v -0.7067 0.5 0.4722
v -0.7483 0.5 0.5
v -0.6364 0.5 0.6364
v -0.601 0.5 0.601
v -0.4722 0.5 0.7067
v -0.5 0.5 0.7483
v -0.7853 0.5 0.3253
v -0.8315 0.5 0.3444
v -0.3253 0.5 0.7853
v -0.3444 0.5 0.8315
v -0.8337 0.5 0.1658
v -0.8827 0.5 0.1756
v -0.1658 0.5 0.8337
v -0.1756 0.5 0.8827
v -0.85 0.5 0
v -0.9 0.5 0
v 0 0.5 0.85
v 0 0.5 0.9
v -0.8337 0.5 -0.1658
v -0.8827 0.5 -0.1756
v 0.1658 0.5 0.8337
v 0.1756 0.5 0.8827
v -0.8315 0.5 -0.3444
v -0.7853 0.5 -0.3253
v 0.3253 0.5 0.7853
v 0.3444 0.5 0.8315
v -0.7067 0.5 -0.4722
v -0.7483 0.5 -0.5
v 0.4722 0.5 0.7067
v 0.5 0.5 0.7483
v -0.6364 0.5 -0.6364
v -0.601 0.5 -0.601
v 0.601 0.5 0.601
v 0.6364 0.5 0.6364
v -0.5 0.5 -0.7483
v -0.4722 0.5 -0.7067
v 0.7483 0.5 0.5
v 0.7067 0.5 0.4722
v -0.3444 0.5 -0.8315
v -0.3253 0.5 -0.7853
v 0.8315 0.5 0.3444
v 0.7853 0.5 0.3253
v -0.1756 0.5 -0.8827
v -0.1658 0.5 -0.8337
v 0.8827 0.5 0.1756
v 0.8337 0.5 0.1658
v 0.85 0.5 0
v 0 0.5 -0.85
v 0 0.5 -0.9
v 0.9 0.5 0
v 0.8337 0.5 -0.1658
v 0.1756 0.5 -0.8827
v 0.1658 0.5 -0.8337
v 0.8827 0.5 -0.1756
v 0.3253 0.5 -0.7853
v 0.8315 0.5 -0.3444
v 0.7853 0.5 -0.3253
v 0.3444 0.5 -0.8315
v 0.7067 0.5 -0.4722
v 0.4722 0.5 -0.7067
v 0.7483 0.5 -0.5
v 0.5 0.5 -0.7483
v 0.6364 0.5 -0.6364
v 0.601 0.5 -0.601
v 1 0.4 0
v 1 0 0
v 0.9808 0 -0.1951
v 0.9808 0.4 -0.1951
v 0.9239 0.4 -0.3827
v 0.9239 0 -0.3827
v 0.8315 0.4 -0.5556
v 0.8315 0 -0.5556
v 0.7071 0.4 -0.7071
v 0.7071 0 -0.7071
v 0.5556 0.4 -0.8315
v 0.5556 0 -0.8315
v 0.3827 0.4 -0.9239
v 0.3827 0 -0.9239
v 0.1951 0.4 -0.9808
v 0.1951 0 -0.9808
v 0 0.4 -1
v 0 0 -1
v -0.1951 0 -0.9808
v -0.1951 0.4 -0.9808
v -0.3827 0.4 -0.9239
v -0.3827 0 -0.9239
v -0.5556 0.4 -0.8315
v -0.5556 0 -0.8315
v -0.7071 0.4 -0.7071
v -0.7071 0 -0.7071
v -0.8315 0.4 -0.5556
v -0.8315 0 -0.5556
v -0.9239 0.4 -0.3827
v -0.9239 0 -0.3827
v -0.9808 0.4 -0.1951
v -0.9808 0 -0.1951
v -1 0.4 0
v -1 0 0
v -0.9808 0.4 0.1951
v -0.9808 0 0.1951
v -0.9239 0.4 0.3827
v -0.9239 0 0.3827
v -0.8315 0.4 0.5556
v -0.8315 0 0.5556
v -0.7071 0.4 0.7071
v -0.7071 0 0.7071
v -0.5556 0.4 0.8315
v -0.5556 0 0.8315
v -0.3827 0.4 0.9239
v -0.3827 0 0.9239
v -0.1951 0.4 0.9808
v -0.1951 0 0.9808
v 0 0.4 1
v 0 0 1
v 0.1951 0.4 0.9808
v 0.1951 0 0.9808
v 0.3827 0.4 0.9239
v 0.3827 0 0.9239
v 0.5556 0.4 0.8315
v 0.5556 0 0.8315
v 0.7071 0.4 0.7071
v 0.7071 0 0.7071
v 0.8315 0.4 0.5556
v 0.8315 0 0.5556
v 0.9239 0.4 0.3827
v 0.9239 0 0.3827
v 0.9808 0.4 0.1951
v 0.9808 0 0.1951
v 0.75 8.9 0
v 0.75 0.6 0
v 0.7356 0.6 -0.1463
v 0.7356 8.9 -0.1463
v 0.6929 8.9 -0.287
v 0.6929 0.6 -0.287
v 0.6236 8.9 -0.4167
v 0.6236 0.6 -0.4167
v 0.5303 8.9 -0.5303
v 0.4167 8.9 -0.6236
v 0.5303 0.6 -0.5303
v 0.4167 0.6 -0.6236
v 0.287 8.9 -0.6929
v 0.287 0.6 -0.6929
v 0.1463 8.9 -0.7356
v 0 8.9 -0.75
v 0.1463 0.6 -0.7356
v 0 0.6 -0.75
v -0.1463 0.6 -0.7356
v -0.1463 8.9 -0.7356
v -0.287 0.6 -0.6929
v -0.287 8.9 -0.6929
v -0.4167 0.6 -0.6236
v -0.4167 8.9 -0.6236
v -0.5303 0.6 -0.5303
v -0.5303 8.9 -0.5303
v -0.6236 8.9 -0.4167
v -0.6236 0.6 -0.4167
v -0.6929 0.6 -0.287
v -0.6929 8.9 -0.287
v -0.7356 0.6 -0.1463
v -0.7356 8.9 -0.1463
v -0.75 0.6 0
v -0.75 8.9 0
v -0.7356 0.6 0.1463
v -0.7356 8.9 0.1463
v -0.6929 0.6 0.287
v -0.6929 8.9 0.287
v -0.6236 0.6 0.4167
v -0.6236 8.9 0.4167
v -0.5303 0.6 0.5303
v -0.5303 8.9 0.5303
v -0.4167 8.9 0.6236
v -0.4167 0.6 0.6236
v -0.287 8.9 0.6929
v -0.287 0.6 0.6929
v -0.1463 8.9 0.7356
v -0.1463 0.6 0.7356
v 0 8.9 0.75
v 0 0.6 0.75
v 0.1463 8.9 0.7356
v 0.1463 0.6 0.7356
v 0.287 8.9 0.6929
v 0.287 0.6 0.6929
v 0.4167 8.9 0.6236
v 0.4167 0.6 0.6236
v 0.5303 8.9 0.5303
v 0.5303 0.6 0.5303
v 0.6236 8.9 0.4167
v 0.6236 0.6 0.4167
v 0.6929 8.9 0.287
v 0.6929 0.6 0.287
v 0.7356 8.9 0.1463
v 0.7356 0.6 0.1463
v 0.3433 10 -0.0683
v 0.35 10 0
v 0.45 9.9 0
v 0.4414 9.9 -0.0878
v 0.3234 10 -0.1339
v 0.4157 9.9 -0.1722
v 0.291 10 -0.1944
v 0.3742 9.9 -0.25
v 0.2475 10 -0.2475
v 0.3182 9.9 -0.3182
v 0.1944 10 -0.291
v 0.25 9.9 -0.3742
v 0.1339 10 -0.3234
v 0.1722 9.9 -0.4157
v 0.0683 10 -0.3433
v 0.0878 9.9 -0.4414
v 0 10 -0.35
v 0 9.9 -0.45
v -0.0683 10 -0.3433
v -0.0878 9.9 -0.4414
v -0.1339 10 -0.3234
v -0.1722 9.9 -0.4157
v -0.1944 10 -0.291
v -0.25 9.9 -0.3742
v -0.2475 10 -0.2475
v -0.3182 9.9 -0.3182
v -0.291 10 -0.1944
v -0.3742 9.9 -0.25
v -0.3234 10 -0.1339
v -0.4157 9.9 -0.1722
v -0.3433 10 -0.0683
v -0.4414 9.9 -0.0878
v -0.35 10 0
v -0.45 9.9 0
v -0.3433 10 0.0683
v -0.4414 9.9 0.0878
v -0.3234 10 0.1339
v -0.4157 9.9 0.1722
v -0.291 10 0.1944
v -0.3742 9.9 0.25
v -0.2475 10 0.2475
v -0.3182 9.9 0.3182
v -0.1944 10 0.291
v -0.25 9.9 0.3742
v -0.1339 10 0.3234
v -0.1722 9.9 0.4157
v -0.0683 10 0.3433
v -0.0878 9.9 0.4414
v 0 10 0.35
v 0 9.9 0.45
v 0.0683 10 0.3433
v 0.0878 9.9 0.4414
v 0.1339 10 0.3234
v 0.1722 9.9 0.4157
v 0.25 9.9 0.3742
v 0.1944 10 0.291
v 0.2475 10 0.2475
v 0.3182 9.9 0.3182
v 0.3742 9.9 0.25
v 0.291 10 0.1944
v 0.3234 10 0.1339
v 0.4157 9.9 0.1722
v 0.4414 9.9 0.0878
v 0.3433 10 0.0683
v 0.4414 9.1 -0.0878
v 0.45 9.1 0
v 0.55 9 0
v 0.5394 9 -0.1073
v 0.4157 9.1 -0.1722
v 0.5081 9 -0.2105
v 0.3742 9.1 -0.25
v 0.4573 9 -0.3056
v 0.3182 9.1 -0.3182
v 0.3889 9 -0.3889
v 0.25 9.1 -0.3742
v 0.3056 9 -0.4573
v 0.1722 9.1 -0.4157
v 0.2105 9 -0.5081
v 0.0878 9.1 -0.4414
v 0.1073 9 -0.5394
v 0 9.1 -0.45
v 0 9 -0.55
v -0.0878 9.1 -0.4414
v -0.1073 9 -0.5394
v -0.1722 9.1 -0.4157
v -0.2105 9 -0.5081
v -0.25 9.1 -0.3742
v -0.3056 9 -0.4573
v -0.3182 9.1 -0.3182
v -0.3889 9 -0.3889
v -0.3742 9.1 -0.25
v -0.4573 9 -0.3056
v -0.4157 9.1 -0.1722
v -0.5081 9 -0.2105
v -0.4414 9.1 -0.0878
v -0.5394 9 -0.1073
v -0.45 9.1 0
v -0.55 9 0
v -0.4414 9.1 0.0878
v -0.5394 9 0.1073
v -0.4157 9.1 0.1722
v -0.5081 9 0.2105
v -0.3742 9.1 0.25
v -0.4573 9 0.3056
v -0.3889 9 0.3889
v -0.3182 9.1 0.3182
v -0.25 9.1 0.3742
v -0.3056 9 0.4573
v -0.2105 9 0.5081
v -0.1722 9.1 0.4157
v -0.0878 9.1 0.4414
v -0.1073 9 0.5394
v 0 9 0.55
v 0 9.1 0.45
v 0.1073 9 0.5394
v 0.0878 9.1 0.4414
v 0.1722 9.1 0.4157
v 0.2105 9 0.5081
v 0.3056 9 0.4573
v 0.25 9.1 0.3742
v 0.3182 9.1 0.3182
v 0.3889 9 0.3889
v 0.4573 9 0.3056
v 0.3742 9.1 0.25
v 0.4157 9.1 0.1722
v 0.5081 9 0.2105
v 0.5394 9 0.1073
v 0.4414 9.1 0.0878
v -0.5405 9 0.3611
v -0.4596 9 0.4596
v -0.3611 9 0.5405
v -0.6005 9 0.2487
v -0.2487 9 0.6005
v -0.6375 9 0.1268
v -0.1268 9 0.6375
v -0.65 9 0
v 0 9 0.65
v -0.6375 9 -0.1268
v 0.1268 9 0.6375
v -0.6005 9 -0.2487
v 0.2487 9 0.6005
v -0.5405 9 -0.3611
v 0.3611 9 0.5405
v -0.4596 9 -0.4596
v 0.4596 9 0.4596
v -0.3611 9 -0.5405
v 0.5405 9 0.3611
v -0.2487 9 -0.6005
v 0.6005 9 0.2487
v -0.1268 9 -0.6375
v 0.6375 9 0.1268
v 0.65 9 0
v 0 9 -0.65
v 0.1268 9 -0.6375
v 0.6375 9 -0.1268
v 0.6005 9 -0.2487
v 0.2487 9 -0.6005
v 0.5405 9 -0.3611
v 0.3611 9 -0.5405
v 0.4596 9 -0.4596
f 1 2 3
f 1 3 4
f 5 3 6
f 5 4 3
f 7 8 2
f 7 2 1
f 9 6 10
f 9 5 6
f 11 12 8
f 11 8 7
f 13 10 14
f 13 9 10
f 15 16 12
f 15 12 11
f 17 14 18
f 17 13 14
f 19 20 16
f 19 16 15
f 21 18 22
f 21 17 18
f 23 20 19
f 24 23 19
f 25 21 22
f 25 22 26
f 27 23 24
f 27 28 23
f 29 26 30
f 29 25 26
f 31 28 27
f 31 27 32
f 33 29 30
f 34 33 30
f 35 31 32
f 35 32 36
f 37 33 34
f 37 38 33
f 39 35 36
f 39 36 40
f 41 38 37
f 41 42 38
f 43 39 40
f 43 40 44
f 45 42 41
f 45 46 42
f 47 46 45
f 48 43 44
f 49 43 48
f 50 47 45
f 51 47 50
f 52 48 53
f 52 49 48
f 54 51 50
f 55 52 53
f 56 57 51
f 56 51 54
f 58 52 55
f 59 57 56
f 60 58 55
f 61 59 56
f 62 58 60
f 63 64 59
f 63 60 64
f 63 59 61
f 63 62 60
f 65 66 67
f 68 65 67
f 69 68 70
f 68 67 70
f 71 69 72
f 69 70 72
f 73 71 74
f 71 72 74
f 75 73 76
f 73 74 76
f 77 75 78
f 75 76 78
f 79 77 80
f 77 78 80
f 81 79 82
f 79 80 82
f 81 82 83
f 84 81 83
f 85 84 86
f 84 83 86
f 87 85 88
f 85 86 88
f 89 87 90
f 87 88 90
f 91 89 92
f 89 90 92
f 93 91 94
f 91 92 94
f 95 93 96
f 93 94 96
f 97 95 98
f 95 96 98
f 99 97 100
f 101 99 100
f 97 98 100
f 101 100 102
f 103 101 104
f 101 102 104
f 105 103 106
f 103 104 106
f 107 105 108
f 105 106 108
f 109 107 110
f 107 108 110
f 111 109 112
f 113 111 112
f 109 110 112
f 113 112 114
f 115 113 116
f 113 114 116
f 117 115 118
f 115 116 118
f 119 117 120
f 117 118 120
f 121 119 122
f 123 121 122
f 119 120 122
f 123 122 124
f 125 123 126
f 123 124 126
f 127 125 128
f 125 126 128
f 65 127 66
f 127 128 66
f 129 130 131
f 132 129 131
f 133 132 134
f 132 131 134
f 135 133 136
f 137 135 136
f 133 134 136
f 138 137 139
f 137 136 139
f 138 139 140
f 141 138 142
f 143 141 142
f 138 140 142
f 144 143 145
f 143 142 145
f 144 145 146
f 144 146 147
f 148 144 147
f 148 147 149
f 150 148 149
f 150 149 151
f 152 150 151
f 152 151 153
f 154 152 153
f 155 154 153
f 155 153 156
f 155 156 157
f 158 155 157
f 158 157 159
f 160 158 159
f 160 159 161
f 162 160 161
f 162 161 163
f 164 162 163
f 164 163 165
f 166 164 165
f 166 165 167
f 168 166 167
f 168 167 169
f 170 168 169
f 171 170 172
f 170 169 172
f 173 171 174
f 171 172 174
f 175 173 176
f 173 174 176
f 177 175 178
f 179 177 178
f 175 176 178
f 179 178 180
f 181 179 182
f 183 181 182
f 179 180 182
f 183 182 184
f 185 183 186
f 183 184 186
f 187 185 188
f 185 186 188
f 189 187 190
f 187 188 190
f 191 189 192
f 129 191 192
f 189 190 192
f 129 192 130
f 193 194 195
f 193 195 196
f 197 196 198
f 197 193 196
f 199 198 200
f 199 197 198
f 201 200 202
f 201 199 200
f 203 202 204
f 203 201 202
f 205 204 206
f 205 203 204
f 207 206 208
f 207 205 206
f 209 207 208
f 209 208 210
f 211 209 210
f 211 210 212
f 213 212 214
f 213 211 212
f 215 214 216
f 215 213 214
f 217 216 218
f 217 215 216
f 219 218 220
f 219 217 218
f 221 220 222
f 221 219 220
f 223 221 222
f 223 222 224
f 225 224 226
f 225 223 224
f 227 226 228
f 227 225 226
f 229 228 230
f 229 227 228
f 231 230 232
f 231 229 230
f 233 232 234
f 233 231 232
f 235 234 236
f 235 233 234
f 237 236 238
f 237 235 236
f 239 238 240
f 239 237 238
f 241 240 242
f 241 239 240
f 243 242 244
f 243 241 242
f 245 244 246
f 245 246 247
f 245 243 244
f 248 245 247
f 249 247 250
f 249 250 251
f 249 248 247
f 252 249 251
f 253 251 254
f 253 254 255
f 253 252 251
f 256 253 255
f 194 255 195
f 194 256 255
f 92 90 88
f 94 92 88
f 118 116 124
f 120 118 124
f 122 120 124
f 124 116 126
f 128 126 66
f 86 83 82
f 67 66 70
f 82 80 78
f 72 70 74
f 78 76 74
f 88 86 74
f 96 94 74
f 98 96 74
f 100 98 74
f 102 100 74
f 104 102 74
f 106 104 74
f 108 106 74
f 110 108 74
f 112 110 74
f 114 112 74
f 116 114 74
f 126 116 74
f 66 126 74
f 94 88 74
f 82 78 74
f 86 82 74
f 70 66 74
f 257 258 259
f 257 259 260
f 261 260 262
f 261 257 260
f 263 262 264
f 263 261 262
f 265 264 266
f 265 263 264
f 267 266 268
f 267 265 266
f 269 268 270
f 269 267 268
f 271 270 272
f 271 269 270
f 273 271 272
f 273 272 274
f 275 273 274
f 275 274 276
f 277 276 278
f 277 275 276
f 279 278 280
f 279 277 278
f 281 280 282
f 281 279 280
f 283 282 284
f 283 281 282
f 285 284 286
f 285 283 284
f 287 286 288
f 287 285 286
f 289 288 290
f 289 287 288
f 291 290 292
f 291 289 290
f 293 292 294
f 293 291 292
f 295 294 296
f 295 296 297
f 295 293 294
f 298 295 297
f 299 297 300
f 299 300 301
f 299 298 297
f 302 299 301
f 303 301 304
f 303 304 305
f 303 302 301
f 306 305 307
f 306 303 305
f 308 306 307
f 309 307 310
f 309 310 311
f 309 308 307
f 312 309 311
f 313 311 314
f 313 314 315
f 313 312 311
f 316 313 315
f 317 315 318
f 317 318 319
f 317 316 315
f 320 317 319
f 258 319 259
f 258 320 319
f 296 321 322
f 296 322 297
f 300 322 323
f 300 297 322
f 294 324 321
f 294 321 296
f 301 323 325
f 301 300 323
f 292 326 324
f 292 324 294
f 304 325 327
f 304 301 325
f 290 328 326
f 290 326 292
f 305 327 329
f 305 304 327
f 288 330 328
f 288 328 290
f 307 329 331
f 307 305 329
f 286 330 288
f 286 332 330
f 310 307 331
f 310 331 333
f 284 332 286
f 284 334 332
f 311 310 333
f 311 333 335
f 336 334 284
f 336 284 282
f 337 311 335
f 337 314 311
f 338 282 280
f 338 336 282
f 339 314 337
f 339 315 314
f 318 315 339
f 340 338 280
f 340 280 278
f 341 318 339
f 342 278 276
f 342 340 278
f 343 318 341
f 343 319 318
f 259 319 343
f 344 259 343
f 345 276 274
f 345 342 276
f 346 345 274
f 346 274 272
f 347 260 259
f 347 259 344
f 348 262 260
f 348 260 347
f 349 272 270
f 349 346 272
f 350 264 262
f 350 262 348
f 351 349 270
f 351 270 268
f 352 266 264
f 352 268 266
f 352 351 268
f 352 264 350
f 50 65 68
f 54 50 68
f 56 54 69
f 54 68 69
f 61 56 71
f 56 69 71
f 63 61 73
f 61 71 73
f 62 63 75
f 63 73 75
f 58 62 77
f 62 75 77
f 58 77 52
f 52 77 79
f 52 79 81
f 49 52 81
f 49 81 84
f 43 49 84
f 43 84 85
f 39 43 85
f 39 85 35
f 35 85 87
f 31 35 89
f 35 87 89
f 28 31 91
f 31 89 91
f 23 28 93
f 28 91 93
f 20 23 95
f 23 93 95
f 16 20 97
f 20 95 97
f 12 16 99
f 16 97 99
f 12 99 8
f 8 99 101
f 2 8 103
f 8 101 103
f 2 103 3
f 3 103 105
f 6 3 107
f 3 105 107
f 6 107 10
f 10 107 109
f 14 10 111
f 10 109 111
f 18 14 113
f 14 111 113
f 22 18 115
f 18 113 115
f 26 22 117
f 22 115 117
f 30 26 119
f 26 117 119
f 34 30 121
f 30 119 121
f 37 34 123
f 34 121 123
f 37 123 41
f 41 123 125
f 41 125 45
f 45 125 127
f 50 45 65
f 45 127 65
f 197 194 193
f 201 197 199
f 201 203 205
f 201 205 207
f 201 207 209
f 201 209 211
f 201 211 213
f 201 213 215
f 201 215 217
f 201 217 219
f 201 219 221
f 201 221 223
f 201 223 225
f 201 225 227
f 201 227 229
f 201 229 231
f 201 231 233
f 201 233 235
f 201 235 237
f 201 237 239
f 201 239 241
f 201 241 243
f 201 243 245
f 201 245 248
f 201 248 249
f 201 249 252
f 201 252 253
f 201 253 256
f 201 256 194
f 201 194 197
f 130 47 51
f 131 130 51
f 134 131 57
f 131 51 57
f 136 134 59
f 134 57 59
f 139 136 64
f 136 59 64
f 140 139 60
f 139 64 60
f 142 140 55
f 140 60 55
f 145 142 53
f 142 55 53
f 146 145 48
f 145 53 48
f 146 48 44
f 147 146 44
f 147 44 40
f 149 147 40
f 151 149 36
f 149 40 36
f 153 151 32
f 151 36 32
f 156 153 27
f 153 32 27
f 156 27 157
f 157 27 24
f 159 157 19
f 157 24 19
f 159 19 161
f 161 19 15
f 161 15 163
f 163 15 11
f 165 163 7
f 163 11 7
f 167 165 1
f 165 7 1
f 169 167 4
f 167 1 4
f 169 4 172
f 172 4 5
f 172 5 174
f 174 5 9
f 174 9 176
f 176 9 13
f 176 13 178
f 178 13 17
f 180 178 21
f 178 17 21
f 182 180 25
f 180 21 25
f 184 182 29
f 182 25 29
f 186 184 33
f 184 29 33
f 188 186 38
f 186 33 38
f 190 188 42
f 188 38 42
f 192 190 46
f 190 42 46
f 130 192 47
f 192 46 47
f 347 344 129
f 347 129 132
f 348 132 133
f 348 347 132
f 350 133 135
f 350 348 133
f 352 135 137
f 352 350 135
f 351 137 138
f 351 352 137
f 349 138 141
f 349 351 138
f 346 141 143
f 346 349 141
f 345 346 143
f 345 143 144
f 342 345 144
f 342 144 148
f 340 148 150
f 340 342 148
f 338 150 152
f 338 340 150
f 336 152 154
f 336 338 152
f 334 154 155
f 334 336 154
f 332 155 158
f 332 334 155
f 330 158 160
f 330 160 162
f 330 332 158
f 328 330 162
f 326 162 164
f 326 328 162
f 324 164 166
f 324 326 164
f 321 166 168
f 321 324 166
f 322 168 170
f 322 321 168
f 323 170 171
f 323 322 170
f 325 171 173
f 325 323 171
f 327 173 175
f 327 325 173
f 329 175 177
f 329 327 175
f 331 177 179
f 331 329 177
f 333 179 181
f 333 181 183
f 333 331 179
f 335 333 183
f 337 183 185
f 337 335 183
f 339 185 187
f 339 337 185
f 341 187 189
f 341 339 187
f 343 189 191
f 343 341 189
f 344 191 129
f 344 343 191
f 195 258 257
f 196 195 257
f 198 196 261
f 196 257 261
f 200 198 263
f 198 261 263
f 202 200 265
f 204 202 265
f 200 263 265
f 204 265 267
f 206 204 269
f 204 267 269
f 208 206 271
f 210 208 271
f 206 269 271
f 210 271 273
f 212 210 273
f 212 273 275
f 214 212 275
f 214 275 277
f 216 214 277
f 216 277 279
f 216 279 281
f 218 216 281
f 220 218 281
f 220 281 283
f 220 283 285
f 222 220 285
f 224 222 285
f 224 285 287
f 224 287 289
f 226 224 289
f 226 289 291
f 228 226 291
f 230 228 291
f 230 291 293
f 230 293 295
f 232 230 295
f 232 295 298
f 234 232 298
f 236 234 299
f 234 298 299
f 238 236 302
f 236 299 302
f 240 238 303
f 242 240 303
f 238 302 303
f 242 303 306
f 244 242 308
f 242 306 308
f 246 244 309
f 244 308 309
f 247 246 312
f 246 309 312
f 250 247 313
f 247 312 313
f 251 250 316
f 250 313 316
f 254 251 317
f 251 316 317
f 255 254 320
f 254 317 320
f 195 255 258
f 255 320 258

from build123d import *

# Parameters (mm, degrees)
SKETCH_1_R      = 1
SKETCH_1_R_2    = 0.75
EXTRUDE_1_DEPTH = 0.5
SKETCH_1_4_R    = 0.75
SKETCH_1_4_R_2  = 0.45
EXTRUDE_2_DEPTH = 9
SKETCH_1_6_R    = 0.45
EXTRUDE_3_DEPTH = 10
CHAMFER_3_SIZE  = 0.1
CHAMFER_4_SIZE  = 0.1
CHAMFER_5_SIZE  = 0.1


with BuildPart() as part:
    # 草图1 → 凸台-拉伸1 (new body)
    with BuildSketch(Plane(origin=(0, 0, 0), x_dir=(1, 0, 0), z_dir=(0, 1, 0))):
        Circle(SKETCH_1_R)
        Circle(SKETCH_1_R_2, mode=Mode.SUBTRACT)
    extrude(amount=EXTRUDE_1_DEPTH)

    # 草图1<4> → 凸台-拉伸2 (add)
    with BuildSketch(Plane(origin=(0, 0, 0), x_dir=(1, 0, 0), z_dir=(0, 1, 0))):
        Circle(SKETCH_1_4_R)
        Circle(SKETCH_1_4_R_2, mode=Mode.SUBTRACT)
    extrude(amount=EXTRUDE_2_DEPTH)

    # 草图1<6> → 凸台-拉伸3 (add)
    with BuildSketch(Plane(origin=(0, 0, 0), x_dir=(1, 0, 0), z_dir=(0, 1, 0))):
        Circle(SKETCH_1_6_R)
    extrude(amount=EXTRUDE_3_DEPTH)

    # 倒角3
    chamfer_3_edges = [part.edges().sort_by_distance(p)[0] for p in [
        (-0.45, 10, 0),
    ]]
    chamfer(chamfer_3_edges, length=CHAMFER_3_SIZE)

    # 倒角4
    chamfer_4_edges = [part.edges().sort_by_distance(p)[0] for p in [
        (-1, 0.5, 0),
        (-0.75, 0.5, 0),
    ]]
    chamfer(chamfer_4_edges, length=CHAMFER_4_SIZE)

    # 倒角5
    chamfer_5_edges = [part.edges().sort_by_distance(p)[0] for p in [
        (-0.45, 9, 0),
        (-0.75, 9, 0),
    ]]
    chamfer(chamfer_5_edges, length=CHAMFER_5_SIZE)


solid = part.part
